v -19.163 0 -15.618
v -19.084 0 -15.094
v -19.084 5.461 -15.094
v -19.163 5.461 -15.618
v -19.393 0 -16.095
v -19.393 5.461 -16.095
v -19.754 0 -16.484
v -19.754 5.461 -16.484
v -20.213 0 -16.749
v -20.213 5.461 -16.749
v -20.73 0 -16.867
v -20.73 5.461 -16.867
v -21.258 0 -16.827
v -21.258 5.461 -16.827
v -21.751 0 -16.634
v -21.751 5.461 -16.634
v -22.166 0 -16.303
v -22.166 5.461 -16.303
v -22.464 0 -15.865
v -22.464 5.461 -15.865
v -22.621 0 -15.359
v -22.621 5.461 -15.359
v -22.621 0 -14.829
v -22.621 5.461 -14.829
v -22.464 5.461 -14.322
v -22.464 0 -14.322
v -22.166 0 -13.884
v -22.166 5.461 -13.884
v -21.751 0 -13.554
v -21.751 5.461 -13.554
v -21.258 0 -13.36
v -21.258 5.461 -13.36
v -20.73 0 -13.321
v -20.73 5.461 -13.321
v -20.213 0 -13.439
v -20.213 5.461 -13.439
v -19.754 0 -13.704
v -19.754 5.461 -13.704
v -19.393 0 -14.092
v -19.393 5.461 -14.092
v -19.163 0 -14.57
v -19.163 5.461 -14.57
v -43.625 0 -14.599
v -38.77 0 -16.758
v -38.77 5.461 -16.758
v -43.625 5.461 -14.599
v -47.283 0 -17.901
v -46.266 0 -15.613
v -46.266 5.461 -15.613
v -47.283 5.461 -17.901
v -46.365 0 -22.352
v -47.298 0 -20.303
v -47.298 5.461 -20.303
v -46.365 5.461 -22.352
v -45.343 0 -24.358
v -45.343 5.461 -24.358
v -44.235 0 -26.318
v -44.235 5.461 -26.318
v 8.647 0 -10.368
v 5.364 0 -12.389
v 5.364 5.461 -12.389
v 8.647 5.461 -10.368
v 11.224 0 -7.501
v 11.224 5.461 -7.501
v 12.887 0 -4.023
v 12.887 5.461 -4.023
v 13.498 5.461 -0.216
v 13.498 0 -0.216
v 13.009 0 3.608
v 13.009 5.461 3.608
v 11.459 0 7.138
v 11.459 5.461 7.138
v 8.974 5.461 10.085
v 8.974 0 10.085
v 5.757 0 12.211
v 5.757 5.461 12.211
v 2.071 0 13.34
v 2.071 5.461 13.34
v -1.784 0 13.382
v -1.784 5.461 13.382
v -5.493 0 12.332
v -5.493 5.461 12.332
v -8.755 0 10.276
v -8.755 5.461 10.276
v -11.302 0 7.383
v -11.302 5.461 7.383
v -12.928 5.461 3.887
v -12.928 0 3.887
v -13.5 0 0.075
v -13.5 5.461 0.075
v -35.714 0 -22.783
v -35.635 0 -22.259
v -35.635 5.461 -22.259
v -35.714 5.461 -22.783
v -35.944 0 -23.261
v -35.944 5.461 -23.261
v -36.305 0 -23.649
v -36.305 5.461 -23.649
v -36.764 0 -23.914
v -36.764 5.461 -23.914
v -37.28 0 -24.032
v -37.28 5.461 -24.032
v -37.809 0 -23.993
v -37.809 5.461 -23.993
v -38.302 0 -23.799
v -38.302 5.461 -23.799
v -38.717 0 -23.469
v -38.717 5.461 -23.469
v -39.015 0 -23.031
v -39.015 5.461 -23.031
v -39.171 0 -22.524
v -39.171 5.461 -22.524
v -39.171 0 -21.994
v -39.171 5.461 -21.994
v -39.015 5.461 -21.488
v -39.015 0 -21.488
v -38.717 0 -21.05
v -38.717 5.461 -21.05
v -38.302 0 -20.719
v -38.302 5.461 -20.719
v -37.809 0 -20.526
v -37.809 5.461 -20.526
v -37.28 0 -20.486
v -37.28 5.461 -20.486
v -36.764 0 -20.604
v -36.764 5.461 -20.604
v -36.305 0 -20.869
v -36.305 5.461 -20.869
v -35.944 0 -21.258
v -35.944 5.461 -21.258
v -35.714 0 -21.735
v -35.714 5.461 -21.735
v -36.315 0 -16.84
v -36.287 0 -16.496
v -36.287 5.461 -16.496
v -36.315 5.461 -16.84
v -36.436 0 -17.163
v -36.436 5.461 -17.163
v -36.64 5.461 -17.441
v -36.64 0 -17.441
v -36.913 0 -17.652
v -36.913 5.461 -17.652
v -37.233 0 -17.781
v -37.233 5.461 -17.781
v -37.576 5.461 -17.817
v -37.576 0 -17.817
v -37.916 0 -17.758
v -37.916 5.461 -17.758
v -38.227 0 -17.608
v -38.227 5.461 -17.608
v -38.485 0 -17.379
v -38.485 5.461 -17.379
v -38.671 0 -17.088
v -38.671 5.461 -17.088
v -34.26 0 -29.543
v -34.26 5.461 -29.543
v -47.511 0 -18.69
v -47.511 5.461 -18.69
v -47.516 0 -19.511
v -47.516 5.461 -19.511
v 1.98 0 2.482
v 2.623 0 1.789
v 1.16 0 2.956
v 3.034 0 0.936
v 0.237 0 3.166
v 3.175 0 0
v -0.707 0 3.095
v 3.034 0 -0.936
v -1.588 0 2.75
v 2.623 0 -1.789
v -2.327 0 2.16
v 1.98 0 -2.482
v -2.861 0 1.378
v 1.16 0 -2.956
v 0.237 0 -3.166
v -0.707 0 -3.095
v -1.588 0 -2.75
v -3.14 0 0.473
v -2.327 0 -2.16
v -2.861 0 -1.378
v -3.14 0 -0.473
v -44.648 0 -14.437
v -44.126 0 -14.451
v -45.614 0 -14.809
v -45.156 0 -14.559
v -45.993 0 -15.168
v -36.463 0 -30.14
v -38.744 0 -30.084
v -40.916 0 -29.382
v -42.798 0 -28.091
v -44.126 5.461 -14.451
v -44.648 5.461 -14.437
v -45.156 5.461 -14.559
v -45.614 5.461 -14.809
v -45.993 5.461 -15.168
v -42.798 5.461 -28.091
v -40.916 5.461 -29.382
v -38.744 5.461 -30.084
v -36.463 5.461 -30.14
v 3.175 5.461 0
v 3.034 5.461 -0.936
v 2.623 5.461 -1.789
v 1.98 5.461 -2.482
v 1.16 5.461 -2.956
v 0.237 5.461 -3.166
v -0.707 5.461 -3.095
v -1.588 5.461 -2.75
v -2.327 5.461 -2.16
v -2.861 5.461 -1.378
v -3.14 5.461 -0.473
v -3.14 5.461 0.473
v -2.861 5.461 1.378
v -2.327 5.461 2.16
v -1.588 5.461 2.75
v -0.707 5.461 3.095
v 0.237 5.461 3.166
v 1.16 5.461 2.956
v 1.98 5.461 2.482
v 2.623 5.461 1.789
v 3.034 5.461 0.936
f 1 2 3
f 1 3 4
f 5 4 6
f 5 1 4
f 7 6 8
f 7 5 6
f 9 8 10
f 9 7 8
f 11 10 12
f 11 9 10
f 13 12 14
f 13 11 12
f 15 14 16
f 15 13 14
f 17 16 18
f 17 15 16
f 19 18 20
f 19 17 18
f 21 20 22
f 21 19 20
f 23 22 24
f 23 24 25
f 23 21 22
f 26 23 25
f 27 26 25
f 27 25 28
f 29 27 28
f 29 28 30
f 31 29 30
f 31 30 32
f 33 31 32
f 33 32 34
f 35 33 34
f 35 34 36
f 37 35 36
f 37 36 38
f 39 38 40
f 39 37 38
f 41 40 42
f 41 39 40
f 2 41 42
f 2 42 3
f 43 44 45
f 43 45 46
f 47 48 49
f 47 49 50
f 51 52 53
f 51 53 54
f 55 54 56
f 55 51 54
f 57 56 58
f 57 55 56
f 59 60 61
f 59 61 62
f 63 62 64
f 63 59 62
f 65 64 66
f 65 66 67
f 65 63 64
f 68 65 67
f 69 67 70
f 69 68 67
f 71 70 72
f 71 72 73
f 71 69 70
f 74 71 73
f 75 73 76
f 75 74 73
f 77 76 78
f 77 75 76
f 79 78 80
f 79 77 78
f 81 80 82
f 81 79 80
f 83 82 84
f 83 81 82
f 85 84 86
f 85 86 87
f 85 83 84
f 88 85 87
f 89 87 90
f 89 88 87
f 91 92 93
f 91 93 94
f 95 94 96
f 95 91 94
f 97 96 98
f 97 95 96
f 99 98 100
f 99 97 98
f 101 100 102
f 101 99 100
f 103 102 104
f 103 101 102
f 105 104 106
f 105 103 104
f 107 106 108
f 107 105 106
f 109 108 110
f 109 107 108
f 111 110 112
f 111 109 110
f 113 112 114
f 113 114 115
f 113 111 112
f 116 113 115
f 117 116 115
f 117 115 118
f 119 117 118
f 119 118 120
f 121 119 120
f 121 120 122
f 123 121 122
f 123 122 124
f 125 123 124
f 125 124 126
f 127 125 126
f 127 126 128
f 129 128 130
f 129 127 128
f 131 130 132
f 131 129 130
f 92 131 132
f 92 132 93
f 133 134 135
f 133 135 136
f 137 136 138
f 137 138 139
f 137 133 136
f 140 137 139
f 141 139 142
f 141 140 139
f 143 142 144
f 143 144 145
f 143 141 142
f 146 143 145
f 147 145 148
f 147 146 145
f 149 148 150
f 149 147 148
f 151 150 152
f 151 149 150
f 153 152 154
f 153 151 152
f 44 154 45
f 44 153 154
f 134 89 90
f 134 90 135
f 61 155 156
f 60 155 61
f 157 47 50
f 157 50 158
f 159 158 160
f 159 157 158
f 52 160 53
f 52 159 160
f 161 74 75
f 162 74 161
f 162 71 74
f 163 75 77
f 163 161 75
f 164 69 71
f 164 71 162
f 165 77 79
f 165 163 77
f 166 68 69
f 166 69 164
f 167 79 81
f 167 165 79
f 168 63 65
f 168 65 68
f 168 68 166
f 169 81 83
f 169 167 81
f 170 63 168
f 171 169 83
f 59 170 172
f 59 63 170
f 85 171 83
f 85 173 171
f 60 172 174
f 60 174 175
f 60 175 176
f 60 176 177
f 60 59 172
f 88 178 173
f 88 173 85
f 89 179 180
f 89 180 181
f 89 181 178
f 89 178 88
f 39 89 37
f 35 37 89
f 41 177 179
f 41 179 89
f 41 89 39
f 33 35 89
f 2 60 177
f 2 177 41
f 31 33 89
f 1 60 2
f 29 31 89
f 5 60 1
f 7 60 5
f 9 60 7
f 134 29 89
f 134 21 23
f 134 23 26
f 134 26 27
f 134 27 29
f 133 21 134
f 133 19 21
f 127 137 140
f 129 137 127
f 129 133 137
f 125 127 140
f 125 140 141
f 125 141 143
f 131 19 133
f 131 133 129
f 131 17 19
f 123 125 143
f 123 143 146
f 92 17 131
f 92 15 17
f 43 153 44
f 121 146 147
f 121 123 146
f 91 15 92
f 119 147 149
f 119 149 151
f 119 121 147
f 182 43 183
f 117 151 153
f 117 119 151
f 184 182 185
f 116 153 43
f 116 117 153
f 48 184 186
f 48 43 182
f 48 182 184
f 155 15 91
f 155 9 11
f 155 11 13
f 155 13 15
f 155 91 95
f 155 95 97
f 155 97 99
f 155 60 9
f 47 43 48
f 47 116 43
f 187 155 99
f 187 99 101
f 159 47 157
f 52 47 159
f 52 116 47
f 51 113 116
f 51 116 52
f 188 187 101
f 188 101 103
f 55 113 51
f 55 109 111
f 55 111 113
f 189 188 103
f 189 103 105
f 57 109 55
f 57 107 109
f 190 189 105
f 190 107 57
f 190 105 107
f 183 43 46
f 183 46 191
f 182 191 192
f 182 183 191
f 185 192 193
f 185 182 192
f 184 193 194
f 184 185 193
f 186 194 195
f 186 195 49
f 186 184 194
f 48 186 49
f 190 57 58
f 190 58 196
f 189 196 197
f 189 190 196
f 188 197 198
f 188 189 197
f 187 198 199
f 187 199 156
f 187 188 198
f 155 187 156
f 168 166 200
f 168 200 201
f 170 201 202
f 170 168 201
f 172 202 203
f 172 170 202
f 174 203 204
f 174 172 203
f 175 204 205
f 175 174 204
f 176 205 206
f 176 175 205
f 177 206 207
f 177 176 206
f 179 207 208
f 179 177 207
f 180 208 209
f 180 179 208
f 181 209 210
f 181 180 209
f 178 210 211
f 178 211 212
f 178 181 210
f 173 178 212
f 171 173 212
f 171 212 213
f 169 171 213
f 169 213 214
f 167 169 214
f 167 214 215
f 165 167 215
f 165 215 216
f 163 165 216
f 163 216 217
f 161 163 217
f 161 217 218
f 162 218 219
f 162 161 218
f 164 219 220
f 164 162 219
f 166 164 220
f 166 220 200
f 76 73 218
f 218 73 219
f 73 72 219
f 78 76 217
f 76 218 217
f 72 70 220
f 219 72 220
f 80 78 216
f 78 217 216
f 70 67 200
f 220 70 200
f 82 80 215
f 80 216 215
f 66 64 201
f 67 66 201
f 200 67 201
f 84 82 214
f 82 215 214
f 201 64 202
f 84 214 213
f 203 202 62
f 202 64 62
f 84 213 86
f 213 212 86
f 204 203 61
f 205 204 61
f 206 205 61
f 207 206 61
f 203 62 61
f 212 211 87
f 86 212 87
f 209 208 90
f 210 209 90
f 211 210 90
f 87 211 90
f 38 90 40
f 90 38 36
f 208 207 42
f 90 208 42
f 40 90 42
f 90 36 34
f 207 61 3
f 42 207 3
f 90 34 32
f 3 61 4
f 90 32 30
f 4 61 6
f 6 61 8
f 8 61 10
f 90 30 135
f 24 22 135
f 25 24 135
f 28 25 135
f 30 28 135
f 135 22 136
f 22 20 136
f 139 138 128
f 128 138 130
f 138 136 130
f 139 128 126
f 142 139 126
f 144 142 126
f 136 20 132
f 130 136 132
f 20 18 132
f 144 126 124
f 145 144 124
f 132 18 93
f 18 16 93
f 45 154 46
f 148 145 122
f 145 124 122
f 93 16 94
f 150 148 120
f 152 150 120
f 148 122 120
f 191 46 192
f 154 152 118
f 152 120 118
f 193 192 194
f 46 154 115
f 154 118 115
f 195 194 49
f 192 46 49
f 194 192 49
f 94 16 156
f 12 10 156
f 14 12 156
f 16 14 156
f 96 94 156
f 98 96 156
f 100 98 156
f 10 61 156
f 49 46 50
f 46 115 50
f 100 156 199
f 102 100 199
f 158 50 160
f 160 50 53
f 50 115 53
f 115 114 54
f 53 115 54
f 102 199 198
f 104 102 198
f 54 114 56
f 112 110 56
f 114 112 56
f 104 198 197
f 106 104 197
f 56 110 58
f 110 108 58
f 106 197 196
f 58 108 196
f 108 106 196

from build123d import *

# Parameters (mm, degrees)
SKETCH1_R           = 1.778
SKETCH1_R_2         = 3.175
BOSS_EXTRUDE1_DEPTH = 5.461


with BuildPart() as part:
    # Sketch1 → Boss-Extrude1 (new body)
    with BuildSketch(Plane(origin=(0, 0, 0), x_dir=(1, 0, 0), z_dir=(0, 1, 0))):
        with BuildLine():
            Line((-38.770225031, 16.757963615), (-43.625448569, 14.598747375))
            ThreePointArc((-43.625448569, 14.598747375), (-45.155674622, 14.559326862), (-46.265582353, 15.613485569))
            Line((-46.265582353, 15.613485569), (-47.282683039, 17.900542834))
            ThreePointArc((-47.282683039, 17.900542834), (-47.541465806, 19.100109045), (-47.298283286, 20.302934833))
            ThreePointArc((-47.298283286, 20.302934833), (-45.865213893, 23.360627542), (-44.234733225, 26.317772344))
            ThreePointArc((-44.234733225, 26.317772344), (-39.855484626, 29.811728531), (-34.259632886, 29.543416329))
            Line((-34.259632886, 29.543416329), (5.363638877, 12.388760148))
            ThreePointArc((5.363638877, 12.388760148), (7.44200849, -11.263503435), (-13.499793526, -0.074664302))
            Line((-13.499793526, -0.074664302), (-36.286855081, 16.495885282))
            ThreePointArc((-36.286855081, 16.495885282), (-37.403602541, 17.810792136), (-38.770225031, 16.757963615))
        make_face()
        with Locations((-20.862458922, 15.093717491)):
            Circle(SKETCH1_R, mode=Mode.SUBTRACT)
        Circle(SKETCH1_R_2, mode=Mode.SUBTRACT)
        with Locations((-37.413253893, 22.259284205)):
            Circle(SKETCH1_R, mode=Mode.SUBTRACT)
    extrude(amount=BOSS_EXTRUDE1_DEPTH)


solid = part.part
